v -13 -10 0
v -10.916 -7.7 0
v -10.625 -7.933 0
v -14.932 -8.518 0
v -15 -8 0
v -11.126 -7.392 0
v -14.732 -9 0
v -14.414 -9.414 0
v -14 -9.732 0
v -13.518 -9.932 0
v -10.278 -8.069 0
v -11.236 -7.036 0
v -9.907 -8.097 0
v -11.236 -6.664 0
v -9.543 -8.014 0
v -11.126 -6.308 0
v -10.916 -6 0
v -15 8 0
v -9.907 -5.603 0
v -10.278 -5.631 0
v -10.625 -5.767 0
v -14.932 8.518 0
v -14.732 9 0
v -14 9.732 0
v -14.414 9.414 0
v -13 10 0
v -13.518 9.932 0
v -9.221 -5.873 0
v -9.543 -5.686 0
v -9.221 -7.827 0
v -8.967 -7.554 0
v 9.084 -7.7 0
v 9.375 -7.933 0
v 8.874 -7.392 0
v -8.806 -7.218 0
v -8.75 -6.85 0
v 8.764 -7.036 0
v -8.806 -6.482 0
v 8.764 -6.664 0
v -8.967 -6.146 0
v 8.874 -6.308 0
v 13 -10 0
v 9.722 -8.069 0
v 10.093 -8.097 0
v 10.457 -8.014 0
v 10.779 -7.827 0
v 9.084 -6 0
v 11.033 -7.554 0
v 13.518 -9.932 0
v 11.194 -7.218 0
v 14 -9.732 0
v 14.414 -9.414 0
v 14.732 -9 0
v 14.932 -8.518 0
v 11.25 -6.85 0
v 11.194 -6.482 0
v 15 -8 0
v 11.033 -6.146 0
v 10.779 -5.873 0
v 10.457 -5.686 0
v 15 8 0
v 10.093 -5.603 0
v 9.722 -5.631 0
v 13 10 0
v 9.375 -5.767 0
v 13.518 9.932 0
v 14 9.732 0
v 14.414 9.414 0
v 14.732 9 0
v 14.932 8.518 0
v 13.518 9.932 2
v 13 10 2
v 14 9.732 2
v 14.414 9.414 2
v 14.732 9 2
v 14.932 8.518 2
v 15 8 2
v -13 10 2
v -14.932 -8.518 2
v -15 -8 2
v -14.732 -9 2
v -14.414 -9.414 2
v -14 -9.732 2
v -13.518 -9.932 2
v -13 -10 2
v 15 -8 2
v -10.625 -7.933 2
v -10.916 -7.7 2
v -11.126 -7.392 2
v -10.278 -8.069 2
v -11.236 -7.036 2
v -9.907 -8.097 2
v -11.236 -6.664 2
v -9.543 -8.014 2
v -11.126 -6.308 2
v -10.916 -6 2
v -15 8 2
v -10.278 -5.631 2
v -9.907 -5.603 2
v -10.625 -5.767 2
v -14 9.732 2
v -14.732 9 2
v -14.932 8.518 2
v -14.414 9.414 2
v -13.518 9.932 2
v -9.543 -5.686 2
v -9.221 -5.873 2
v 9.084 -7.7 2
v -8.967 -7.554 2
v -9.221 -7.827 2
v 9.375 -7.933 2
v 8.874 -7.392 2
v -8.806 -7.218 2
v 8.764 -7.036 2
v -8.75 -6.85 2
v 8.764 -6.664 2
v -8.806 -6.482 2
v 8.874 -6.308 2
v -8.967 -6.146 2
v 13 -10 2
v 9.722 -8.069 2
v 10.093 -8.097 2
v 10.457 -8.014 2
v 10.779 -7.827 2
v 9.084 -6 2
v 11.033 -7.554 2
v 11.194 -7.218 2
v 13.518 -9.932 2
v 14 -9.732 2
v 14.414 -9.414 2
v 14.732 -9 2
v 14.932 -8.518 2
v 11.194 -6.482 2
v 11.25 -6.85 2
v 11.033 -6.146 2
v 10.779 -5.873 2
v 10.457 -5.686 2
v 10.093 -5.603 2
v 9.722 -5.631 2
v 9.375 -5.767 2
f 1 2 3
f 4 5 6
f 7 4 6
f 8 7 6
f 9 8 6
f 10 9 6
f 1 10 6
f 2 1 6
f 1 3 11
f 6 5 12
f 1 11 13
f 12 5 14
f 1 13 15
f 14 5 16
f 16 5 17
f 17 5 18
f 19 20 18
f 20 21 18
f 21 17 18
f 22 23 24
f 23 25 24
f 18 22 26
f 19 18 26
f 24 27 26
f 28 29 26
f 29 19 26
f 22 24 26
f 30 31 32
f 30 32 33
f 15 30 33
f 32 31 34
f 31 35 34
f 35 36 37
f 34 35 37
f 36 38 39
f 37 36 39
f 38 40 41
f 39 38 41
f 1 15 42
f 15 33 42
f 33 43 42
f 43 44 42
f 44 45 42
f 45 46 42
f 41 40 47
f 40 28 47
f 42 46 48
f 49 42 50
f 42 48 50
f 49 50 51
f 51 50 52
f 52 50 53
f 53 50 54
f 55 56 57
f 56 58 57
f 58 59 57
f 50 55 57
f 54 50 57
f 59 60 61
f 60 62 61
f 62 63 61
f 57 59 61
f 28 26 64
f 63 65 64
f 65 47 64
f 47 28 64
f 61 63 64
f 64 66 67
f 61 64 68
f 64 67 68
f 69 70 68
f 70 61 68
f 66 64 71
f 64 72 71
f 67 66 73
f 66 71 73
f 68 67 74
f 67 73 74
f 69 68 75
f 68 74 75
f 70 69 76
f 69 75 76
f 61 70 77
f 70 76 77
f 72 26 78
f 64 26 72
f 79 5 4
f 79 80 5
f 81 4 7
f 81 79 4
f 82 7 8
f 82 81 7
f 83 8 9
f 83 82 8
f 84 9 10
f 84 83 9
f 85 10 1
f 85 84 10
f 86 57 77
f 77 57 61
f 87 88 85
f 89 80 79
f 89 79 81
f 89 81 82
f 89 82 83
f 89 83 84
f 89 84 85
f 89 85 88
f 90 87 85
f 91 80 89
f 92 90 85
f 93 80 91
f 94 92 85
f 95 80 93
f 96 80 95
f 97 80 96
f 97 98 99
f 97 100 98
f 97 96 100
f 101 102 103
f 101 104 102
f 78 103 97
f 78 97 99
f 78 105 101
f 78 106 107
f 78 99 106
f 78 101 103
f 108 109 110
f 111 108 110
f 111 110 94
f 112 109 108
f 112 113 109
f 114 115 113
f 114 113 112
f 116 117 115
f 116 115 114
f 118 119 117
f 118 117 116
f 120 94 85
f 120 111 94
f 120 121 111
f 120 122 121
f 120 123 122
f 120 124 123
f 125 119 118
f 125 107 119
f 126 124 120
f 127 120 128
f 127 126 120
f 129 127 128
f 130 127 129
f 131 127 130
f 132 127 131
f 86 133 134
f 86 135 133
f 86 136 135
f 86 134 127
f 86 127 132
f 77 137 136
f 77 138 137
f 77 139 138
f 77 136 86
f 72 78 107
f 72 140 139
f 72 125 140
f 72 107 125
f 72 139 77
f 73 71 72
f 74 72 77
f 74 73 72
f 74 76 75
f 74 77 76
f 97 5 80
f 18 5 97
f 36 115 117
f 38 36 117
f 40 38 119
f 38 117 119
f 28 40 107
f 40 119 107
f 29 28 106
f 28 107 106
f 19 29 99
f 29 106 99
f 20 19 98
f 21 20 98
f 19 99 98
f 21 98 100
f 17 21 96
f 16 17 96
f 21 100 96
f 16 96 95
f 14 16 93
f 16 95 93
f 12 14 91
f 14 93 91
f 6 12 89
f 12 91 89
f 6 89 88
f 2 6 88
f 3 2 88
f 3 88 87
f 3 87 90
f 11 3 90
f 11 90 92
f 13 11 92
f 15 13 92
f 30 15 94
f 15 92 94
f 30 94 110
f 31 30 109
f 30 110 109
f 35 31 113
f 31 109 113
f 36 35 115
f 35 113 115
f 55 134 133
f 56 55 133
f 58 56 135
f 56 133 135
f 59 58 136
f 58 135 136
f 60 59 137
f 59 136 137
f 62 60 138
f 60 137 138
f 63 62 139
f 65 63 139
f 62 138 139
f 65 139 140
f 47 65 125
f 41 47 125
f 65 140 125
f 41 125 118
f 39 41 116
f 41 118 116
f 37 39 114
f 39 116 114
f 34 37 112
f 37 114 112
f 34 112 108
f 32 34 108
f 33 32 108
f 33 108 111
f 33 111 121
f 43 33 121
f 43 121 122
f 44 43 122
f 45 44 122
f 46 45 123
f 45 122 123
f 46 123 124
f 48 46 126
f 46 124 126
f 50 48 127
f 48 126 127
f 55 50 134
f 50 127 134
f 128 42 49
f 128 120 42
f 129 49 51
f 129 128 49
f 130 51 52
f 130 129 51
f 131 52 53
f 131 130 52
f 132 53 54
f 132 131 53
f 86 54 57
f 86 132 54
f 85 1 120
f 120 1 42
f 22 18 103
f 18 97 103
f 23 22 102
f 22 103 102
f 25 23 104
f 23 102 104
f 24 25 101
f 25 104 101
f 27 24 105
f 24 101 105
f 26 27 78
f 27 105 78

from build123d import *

# Parameters (mm, degrees)
SKETCH_1_W          = 30
SKETCH_1_H          = 20
EXTRUDE_1_DEPTH     = 2
SKETCH_2_R          = 1.25
CUT_EXTRUDE_1_DEPTH = 2
FILLET_1_R          = 2


with BuildPart() as part:
    # 草图1 → 凸台-拉伸1 (new body)
    with BuildSketch(Plane.XY):
        Rectangle(SKETCH_1_W, SKETCH_1_H)
    extrude(amount=EXTRUDE_1_DEPTH)

    # 草图2 → 切除-拉伸1 (cut)
    with BuildSketch(Plane.XY.offset(2)):
        with Locations((-10, -6.85)):
            Circle(SKETCH_2_R)
        with Locations((10, -6.85)):
            Circle(SKETCH_2_R)
    extrude(amount=-CUT_EXTRUDE_1_DEPTH, mode=Mode.SUBTRACT)

    # 圆角1
    fillet_1_edges = [part.edges().sort_by_distance(p)[0] for p in [
        (15, -10, 1),
        (-15, -10, 1),
        (-15, 10, 1),
        (15, 10, 1),
    ]]
    fillet(fillet_1_edges, radius=FILLET_1_R)


solid = part.part
